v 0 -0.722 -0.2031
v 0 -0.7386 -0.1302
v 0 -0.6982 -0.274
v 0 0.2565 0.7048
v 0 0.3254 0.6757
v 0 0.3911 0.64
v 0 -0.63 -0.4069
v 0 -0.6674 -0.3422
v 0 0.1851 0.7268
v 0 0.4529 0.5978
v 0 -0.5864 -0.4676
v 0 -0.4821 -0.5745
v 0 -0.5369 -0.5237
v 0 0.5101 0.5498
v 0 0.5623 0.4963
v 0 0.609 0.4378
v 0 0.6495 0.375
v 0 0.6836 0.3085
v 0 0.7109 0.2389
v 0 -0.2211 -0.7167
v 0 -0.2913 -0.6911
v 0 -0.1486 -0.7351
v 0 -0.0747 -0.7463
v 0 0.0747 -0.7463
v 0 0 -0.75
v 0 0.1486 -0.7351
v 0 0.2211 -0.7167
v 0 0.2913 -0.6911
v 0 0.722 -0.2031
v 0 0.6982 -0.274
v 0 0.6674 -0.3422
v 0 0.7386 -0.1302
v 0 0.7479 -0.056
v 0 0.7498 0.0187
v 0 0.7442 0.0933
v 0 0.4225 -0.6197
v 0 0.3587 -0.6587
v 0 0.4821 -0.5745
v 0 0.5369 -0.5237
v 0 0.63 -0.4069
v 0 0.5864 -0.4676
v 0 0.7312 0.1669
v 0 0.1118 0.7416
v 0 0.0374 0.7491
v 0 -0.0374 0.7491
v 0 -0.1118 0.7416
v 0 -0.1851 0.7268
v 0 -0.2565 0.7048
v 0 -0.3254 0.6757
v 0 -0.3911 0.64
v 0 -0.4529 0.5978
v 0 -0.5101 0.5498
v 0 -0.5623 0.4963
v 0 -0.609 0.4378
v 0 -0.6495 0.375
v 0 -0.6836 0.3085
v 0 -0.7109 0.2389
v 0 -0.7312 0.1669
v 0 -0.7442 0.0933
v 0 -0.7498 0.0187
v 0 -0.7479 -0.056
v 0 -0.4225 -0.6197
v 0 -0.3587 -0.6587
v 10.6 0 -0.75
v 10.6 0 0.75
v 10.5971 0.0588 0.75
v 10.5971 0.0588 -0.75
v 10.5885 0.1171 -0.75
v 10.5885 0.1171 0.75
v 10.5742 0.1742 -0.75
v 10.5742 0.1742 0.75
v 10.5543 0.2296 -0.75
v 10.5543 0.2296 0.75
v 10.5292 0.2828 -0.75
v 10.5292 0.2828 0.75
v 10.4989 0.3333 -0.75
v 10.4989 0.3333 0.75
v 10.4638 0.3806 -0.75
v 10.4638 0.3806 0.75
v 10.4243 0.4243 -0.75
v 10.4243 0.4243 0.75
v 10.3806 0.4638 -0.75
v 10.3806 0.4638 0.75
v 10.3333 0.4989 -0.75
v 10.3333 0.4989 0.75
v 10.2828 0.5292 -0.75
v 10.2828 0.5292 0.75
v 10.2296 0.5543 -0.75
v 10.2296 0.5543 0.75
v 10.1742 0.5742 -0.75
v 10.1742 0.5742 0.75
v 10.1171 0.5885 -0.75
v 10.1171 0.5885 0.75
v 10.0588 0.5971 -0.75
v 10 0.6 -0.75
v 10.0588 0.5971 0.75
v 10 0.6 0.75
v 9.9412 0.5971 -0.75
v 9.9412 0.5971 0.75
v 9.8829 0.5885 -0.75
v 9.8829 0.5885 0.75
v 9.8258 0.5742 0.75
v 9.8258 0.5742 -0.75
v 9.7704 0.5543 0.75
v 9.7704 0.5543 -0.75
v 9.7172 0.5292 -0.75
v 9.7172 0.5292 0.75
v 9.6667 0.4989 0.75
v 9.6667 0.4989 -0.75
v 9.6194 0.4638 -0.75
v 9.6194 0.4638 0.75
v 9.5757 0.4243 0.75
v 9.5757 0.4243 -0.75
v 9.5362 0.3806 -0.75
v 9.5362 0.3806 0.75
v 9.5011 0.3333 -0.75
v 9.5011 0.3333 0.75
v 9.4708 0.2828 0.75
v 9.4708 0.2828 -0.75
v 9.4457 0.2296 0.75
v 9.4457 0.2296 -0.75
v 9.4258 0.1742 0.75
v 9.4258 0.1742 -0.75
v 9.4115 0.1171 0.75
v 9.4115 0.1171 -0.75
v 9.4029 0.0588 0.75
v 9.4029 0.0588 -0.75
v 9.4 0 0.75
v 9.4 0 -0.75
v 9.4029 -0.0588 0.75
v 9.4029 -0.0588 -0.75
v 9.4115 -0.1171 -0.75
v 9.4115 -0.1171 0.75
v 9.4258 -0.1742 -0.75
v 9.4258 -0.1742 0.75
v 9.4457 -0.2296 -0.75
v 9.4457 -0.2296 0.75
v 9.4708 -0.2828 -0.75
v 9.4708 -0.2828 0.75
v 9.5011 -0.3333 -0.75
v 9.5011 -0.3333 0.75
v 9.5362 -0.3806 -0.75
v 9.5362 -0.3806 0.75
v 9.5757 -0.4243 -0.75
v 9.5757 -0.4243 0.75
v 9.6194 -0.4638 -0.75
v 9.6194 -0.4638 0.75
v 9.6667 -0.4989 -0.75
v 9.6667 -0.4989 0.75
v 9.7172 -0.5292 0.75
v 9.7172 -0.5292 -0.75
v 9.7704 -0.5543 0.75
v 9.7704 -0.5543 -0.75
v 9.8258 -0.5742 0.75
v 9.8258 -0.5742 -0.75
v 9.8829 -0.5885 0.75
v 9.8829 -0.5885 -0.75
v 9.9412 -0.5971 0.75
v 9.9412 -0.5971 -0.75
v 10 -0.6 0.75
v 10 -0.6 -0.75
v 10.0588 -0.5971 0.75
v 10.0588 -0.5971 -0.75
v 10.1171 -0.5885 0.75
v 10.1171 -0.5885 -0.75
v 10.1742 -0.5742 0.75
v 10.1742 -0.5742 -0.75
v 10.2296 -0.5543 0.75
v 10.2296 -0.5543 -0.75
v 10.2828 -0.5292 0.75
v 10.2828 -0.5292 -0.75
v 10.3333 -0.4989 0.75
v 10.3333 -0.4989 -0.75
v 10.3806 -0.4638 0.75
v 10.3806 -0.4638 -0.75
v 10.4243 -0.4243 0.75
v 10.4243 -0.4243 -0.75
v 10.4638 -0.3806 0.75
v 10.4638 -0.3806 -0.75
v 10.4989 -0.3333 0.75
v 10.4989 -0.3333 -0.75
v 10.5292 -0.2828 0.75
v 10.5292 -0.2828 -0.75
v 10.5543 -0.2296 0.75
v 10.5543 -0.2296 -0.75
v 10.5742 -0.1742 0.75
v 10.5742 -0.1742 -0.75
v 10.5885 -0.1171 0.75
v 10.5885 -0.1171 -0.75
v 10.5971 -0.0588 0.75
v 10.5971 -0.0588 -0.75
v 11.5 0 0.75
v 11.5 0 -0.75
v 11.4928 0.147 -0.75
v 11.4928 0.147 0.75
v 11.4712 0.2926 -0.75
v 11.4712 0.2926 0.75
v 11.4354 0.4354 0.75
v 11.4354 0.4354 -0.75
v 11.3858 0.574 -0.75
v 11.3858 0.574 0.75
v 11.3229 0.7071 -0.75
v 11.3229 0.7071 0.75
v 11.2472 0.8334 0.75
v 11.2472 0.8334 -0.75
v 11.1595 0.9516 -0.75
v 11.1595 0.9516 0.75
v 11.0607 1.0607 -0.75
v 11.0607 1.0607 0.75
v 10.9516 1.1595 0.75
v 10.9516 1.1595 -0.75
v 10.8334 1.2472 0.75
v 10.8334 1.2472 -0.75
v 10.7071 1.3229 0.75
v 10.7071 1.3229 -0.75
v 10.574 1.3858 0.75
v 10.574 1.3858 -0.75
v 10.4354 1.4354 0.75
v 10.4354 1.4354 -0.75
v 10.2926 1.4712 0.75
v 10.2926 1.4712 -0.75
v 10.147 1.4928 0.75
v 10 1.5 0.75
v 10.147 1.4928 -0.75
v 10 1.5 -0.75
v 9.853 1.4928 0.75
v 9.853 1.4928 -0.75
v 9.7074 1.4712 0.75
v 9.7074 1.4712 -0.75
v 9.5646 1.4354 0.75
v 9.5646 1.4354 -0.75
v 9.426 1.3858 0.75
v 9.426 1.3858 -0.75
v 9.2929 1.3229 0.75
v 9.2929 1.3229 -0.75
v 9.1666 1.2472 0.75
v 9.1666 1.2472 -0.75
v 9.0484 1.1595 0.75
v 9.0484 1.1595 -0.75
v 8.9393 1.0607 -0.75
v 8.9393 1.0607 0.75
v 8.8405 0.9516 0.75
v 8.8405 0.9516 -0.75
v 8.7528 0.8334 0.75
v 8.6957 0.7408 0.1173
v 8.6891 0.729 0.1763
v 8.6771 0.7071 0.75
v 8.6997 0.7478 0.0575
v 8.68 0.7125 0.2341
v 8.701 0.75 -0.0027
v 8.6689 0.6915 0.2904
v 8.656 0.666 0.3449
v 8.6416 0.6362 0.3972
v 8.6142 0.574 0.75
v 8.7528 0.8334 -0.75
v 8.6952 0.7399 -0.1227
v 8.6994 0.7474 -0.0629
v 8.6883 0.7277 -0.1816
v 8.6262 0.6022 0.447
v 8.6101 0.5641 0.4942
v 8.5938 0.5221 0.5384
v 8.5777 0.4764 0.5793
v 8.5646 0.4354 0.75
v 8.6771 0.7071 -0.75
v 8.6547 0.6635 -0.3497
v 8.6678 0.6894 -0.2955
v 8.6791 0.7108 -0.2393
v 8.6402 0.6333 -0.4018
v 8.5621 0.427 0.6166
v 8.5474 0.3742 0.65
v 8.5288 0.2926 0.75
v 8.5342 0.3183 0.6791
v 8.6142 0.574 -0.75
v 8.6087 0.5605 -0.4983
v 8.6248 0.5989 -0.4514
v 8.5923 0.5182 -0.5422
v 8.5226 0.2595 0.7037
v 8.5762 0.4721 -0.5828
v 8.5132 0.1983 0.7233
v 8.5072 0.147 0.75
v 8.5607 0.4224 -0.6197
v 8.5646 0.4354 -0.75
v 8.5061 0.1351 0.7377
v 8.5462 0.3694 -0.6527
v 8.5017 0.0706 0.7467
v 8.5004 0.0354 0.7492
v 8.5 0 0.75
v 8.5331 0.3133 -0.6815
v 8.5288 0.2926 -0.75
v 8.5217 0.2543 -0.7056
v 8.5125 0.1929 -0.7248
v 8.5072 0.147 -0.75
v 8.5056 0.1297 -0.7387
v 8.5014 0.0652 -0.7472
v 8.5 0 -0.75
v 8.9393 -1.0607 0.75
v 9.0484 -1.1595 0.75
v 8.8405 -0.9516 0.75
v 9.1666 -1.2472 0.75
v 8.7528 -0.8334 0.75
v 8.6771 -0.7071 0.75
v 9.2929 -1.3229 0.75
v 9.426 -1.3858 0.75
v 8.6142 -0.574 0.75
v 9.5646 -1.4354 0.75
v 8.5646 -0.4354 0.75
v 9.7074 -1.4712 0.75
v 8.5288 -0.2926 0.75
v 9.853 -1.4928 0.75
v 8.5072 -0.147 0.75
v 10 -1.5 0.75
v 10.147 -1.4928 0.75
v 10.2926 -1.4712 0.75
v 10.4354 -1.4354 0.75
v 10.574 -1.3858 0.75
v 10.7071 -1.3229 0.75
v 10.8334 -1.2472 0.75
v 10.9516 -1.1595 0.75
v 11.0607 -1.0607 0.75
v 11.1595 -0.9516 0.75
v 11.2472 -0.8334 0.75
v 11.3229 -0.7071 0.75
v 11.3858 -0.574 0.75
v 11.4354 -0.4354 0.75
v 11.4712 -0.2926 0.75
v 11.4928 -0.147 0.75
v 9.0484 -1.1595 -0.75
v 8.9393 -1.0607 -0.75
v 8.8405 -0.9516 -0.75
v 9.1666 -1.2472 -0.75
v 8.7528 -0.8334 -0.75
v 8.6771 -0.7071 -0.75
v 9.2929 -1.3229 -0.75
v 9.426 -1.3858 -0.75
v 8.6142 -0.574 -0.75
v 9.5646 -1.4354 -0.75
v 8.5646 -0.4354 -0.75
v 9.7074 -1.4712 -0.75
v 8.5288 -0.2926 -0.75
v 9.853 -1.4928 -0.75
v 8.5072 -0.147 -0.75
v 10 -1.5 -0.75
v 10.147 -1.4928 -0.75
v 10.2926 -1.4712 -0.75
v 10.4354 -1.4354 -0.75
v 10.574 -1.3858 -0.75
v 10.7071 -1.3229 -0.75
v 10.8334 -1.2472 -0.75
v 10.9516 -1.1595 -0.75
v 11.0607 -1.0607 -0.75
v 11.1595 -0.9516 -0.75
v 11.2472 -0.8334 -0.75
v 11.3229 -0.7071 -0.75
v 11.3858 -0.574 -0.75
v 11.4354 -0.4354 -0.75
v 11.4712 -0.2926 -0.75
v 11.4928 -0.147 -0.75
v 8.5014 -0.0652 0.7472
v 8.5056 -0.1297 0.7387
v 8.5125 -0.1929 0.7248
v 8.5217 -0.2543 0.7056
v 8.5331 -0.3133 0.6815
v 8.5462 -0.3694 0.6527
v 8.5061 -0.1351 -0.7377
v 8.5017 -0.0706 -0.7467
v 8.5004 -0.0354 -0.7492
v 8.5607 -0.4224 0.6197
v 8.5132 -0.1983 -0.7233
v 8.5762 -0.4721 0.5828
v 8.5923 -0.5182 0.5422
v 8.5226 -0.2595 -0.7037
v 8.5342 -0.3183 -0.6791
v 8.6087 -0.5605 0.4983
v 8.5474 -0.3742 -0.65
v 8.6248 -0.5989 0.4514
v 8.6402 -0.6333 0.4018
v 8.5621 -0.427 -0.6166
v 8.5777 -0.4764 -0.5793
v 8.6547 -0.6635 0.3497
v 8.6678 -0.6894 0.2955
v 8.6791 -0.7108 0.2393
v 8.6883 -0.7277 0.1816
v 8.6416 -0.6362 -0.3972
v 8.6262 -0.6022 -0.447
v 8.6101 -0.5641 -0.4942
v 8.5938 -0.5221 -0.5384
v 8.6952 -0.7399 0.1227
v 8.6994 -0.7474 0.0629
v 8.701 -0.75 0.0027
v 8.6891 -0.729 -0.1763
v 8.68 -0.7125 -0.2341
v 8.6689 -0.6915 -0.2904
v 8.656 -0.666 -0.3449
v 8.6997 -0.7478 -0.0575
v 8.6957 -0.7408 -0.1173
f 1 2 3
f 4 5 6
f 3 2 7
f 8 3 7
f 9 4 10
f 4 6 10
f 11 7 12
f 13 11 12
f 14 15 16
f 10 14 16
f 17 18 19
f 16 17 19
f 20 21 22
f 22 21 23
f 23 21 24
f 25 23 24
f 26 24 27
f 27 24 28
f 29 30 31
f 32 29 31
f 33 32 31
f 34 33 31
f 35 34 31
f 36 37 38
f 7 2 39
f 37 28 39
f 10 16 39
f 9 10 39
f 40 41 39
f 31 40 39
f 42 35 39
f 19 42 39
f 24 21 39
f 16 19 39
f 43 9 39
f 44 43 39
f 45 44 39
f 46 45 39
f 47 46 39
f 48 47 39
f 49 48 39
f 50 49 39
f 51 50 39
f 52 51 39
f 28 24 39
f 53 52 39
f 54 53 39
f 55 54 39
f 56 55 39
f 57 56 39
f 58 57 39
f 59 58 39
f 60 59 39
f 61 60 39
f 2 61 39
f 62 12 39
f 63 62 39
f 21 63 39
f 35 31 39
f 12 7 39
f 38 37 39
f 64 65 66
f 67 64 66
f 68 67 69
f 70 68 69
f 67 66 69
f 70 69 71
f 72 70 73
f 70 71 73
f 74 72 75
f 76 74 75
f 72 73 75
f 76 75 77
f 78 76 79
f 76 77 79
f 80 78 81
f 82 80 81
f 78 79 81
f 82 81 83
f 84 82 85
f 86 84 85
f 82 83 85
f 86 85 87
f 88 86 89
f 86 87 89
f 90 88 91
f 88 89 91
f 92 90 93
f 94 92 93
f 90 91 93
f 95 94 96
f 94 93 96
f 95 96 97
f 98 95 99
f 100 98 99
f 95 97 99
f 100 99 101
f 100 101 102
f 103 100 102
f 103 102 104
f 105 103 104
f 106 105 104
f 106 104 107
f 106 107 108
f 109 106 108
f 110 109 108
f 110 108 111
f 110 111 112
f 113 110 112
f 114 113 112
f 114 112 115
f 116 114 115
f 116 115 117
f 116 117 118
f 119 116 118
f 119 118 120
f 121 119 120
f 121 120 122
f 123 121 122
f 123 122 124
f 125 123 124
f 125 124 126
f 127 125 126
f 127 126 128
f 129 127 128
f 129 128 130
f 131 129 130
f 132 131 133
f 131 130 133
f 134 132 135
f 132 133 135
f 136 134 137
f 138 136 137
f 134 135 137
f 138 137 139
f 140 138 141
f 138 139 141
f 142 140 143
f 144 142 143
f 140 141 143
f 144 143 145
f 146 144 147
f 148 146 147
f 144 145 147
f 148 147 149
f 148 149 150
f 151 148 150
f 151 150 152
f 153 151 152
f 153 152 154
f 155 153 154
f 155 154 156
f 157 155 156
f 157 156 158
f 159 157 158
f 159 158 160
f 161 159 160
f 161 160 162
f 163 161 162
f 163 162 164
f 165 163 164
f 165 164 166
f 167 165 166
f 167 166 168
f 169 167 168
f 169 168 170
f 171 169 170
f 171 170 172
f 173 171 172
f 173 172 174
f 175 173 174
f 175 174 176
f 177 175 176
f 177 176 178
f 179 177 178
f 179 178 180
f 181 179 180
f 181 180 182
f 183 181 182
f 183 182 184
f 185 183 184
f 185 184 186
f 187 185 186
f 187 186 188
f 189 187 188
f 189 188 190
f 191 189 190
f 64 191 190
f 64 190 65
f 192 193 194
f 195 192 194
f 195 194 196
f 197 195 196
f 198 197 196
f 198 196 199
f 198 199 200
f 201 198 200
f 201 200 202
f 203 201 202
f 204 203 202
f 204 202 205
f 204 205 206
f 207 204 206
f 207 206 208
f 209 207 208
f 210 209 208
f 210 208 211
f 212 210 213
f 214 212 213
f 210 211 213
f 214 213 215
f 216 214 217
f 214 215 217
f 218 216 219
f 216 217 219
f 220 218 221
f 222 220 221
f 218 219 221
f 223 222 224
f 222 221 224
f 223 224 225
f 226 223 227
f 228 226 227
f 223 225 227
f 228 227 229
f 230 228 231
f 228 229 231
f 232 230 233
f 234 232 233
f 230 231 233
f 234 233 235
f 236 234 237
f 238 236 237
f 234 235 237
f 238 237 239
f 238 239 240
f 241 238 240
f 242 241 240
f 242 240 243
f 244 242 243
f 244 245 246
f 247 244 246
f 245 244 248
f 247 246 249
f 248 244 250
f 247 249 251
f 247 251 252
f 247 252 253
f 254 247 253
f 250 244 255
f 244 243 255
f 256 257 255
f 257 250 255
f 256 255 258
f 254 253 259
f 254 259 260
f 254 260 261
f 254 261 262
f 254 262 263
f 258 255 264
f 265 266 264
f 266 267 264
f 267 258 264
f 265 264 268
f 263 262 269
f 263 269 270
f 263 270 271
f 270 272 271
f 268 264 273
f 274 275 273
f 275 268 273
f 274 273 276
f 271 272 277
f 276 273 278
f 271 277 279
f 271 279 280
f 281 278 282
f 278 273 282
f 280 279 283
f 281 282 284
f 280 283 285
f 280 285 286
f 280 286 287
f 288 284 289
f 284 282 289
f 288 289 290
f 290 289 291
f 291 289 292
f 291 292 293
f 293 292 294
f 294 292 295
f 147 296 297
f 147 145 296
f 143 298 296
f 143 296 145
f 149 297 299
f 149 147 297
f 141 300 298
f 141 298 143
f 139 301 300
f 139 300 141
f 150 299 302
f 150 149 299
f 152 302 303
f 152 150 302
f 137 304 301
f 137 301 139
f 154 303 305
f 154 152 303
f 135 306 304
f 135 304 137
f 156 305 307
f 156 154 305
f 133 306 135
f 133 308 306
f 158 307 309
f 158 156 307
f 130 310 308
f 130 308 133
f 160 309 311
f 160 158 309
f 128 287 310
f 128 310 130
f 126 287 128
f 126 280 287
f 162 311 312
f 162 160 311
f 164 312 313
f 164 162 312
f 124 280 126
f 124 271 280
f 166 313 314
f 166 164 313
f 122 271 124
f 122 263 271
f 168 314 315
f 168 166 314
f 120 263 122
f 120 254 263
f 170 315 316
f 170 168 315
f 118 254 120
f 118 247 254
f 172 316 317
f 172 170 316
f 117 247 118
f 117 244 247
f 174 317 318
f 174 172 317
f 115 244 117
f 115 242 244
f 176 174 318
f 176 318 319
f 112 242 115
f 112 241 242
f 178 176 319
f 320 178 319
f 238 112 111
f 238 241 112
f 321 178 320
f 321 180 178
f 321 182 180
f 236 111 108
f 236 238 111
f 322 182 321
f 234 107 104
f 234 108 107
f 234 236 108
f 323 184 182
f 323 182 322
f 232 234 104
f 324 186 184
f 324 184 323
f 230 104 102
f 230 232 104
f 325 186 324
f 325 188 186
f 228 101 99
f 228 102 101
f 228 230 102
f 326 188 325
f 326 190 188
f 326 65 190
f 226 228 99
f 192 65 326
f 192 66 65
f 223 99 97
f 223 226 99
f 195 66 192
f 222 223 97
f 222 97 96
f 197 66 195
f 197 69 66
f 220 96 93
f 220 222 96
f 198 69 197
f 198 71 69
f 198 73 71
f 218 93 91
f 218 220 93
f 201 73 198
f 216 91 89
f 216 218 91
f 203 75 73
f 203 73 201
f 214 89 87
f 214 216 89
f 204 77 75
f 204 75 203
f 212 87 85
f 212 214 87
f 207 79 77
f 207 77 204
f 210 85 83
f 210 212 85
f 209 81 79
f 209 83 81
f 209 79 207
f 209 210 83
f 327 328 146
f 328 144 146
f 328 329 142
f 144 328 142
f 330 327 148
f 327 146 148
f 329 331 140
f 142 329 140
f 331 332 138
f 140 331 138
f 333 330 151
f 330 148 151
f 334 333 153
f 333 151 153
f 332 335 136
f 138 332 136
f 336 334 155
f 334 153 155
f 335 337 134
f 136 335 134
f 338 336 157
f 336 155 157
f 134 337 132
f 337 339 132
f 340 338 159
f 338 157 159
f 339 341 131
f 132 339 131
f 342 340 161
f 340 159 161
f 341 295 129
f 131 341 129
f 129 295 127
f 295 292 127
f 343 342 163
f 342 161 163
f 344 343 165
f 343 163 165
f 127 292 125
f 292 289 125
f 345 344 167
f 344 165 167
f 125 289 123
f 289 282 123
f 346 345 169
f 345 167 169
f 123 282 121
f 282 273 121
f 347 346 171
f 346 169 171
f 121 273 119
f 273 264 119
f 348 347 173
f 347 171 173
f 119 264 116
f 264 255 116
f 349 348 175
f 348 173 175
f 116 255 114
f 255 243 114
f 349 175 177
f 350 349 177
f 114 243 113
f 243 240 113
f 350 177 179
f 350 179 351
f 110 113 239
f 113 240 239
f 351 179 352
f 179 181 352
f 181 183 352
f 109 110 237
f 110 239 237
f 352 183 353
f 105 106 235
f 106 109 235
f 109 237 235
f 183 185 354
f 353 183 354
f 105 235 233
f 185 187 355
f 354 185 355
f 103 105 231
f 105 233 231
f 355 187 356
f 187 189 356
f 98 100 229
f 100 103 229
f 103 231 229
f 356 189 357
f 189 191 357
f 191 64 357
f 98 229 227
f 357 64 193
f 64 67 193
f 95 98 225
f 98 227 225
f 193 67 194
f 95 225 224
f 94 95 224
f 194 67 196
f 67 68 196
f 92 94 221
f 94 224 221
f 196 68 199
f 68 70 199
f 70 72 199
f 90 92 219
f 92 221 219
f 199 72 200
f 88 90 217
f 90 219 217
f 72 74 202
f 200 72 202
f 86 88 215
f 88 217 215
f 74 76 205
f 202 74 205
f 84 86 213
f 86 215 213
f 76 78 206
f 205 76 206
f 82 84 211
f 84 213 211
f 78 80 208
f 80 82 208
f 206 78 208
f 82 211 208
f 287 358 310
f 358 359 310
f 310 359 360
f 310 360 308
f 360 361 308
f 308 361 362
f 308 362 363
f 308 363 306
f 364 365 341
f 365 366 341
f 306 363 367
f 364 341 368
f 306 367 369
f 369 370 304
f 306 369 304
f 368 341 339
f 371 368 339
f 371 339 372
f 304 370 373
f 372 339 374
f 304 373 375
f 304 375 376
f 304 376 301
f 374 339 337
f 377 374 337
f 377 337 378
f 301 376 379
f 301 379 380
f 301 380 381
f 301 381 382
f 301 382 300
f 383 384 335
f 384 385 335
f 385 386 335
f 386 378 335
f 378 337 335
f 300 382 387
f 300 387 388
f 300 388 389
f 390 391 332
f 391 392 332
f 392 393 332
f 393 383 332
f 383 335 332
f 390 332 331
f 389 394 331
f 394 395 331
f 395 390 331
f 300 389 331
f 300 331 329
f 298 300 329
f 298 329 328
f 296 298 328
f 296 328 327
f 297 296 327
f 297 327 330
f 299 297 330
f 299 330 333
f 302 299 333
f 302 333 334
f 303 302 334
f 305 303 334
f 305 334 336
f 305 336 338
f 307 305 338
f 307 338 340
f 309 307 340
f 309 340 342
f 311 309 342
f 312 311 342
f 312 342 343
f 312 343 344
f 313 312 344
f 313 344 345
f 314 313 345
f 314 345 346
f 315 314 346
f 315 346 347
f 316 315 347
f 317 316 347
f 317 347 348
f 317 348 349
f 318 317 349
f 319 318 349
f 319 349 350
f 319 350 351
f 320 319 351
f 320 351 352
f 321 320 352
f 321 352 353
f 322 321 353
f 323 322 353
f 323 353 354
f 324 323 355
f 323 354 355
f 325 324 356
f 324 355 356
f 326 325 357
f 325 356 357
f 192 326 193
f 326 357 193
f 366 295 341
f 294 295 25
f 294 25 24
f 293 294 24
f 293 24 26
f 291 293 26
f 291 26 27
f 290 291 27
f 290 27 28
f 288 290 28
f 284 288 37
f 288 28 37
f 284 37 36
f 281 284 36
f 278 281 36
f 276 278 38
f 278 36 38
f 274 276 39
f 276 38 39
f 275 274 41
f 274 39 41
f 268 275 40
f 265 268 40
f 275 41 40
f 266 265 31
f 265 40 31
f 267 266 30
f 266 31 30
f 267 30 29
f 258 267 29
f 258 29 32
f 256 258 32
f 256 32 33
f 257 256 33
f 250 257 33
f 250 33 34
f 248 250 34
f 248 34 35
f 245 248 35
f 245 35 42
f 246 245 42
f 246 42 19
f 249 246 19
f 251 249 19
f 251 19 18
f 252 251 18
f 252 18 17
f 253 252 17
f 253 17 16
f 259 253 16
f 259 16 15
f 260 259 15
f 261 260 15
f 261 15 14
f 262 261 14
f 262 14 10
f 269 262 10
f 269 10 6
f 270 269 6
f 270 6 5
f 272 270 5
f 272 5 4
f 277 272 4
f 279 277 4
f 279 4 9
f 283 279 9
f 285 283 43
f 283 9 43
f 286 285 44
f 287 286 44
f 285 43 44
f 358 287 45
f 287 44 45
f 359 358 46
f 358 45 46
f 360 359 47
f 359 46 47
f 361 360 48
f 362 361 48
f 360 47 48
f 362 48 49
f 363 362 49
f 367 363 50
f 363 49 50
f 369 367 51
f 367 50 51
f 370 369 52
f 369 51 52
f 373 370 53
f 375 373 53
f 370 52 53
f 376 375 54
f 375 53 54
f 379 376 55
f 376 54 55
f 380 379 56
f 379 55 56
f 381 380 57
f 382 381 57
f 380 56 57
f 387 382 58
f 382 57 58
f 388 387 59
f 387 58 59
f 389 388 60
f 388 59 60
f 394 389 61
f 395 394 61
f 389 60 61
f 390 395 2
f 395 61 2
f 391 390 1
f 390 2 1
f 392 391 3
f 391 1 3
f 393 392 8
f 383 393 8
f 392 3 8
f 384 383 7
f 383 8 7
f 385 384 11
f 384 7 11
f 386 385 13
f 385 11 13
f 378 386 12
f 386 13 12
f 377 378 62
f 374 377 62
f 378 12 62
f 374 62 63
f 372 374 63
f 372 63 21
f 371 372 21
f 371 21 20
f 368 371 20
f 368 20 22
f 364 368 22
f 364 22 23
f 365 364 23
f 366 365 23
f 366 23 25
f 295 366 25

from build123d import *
from build123d.topology import SkipClean

# Parameters (mm, degrees)
SKETCH1_R                = 0.75
BOSS_EXTRUDE1_DEPTH      = 10
BOSS_EXTRUDE2_DEPTH      = 0.75
BOSS_EXTRUDE2_DEPTH_BACK = 0.75
SKETCH2_R                = 1.5
SKETCH3_R                = 0.6
CUT_EXTRUDE1_DEPTH       = 1.5


with BuildPart() as part:
    # Sketch1 → Boss-Extrude1 (new body)
    with BuildSketch(Plane(origin=(0, 0, 0), x_dir=(0, 0, -1), z_dir=(1, 0, 0))):
        Circle(SKETCH1_R)
    extrude(amount=BOSS_EXTRUDE1_DEPTH)

    # Sketch2 → Boss-Extrude2 (add, two sides: drawn at the far end of the back side and taken through both)
    with SkipClean():  # the faces are left unmerged after this step: merging them gives an invalid solid
        with BuildSketch(Plane.XY.offset(-BOSS_EXTRUDE2_DEPTH_BACK)):
            with Locations((10, 0)):
                Circle(SKETCH2_R)
        extrude(amount=BOSS_EXTRUDE2_DEPTH + BOSS_EXTRUDE2_DEPTH_BACK)

    # Sketch3 → Cut-Extrude1 (cut)
    with SkipClean():  # the faces are left unmerged after this step: merging them gives an invalid solid
        with BuildSketch(Plane.XY.offset(0.75)):
            with Locations((10, 0)):
                Circle(SKETCH3_R)
        extrude(amount=-CUT_EXTRUDE1_DEPTH, mode=Mode.SUBTRACT)


solid = part.part
